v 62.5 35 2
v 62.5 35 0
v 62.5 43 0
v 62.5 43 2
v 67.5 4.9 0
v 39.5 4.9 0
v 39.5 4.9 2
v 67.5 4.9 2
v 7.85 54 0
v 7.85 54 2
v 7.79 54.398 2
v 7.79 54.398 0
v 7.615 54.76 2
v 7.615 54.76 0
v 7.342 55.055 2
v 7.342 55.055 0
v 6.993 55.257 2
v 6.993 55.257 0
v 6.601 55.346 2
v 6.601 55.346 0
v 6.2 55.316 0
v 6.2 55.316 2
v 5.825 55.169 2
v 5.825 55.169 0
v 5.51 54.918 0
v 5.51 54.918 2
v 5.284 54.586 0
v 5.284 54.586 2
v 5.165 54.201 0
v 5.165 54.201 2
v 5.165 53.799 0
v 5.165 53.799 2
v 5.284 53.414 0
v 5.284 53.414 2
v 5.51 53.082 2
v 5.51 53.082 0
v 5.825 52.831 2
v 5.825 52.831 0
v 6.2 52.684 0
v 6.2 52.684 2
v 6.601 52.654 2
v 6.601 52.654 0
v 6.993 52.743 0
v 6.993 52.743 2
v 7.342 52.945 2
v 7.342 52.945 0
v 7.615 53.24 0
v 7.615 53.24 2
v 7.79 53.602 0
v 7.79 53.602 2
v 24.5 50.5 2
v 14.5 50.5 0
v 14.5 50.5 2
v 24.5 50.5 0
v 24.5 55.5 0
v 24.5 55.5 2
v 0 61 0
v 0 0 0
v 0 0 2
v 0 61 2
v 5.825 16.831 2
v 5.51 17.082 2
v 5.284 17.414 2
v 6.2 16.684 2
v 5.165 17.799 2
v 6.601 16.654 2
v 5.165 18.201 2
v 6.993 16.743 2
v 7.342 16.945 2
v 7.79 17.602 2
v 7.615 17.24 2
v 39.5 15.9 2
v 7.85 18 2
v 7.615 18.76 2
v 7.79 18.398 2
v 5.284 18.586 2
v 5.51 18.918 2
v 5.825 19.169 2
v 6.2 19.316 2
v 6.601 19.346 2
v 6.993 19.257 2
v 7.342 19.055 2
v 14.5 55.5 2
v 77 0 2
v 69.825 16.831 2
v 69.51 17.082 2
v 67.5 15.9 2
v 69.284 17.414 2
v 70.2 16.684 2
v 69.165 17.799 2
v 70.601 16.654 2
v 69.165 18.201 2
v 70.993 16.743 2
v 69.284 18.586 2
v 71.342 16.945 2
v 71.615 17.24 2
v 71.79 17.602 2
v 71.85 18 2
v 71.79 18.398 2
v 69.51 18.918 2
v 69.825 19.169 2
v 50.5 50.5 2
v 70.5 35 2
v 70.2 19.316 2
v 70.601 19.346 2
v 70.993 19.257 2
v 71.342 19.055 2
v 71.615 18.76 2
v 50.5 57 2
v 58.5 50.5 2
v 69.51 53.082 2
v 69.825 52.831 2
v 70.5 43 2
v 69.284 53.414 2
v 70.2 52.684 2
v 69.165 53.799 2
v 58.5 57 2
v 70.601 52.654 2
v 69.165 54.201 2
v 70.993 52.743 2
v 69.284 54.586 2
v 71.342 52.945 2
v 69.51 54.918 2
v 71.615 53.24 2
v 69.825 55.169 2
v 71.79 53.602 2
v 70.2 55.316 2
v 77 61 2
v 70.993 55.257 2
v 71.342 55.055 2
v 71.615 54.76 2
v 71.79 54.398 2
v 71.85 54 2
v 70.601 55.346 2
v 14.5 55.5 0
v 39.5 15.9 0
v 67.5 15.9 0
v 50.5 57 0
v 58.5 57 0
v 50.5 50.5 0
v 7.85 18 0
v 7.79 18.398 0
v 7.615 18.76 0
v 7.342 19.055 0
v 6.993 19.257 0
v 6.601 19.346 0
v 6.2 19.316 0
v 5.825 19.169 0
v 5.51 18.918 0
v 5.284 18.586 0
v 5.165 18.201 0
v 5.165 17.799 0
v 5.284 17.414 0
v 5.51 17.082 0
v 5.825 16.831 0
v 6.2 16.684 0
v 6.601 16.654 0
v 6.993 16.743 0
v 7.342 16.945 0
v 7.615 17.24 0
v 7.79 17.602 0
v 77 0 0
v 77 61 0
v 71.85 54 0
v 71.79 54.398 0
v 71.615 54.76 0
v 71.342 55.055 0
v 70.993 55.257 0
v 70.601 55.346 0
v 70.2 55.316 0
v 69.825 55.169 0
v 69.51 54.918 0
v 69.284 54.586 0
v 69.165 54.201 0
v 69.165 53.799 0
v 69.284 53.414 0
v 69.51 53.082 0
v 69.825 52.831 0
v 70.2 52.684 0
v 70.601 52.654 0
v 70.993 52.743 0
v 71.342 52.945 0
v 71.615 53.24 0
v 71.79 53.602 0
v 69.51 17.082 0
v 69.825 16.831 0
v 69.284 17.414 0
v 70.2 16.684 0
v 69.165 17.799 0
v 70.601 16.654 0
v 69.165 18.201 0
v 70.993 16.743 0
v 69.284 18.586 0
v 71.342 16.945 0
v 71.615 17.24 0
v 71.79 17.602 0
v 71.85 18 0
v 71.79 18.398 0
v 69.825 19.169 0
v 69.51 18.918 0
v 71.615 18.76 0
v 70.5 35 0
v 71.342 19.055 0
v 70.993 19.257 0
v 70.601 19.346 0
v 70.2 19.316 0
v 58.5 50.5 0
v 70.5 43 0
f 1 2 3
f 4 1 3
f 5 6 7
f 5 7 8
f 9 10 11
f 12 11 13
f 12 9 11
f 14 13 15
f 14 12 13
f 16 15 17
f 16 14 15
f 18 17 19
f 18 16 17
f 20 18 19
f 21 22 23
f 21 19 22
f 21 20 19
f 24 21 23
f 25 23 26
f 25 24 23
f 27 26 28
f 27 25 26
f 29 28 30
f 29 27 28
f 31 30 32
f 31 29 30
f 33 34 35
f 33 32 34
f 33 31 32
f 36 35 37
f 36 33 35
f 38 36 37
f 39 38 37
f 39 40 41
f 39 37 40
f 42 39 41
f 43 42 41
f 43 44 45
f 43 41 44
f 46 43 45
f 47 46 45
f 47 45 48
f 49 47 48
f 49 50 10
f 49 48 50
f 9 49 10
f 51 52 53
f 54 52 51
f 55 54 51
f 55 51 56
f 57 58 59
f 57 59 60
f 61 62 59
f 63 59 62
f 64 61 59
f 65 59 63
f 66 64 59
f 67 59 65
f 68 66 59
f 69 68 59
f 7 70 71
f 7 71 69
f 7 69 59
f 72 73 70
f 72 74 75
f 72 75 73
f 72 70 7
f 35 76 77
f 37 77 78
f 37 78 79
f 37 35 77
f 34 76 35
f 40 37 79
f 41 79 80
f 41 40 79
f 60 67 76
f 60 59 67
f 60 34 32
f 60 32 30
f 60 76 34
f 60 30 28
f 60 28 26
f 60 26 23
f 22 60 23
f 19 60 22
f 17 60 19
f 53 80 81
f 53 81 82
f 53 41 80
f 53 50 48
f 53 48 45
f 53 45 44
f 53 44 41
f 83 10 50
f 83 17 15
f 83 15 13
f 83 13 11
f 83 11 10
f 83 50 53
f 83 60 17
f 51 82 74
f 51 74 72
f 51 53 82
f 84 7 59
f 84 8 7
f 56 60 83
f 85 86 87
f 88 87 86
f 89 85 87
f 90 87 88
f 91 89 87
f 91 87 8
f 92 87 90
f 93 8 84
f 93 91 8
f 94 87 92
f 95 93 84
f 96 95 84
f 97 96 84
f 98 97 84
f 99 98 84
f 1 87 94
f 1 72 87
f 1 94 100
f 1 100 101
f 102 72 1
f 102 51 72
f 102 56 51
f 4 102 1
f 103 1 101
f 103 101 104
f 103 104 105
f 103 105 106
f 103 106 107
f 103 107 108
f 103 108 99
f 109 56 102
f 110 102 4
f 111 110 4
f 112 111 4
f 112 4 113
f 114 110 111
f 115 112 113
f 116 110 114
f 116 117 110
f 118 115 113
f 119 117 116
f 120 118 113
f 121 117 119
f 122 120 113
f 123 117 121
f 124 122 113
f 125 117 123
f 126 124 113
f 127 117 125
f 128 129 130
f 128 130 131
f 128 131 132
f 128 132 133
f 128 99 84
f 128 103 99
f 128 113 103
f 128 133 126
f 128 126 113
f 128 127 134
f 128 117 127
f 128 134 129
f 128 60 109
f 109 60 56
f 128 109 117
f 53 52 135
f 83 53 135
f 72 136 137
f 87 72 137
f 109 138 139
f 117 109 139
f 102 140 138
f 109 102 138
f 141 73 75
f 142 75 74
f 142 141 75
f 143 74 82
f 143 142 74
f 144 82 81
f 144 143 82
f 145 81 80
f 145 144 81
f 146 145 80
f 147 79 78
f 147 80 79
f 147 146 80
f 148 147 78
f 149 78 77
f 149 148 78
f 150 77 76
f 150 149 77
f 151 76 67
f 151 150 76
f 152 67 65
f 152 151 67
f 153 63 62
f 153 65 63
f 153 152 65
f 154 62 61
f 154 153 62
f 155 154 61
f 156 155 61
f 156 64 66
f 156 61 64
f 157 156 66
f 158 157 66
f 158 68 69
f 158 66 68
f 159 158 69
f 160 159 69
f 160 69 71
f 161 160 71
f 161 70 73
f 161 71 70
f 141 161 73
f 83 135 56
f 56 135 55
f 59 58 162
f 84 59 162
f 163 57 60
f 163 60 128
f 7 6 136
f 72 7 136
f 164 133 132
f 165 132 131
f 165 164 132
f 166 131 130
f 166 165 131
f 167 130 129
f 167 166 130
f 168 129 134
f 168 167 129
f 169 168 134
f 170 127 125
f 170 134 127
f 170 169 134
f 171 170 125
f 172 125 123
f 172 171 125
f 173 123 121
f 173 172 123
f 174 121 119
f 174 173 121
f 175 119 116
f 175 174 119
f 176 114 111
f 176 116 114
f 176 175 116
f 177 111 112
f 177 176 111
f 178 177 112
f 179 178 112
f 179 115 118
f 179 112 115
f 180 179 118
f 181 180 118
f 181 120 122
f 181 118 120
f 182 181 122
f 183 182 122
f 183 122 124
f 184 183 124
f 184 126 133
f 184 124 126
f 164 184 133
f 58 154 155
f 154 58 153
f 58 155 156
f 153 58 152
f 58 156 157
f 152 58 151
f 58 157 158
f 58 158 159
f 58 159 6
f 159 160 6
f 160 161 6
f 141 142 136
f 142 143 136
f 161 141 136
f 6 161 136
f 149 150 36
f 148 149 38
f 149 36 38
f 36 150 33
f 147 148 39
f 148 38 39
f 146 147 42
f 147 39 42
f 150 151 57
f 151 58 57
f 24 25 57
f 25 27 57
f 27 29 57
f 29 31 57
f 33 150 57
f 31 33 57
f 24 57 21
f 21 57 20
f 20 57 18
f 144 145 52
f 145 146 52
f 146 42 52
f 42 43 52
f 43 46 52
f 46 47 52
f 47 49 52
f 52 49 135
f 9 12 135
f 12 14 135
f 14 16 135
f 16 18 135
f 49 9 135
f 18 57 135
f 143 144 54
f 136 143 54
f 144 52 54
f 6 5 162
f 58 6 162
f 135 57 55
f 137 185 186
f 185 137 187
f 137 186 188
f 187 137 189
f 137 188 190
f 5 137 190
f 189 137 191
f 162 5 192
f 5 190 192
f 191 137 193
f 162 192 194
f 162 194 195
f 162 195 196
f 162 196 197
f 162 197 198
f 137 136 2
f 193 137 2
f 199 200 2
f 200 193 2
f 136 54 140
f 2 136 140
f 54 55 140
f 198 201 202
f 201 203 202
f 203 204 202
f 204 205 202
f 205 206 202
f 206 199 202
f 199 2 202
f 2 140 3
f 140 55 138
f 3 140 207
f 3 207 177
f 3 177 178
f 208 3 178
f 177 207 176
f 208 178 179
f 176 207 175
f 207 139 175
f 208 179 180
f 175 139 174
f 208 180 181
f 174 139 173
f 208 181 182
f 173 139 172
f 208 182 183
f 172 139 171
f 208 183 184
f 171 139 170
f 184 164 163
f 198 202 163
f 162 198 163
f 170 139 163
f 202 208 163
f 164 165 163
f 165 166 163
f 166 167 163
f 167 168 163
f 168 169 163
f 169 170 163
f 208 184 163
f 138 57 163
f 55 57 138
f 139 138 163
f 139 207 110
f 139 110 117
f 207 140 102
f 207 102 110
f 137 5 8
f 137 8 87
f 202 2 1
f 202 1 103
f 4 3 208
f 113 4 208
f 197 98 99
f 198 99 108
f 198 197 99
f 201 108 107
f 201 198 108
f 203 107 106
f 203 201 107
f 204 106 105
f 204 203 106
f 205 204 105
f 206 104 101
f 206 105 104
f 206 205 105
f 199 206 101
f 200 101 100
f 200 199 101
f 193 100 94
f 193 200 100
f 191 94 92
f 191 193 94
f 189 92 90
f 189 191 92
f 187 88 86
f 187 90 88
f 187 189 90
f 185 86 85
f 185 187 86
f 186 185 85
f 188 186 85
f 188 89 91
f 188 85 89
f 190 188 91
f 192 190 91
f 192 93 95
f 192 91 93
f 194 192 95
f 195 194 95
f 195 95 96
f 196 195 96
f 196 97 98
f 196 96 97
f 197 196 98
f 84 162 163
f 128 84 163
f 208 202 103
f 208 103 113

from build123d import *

# Parameters (mm, degrees)
SKETCH_1_W          = 77
SKETCH_1_H          = 61
EXTRUDE_1_DEPTH     = 2
SKETCH_2_W          = 28
SKETCH_2_H          = 11
CUT_EXTRUDE_1_DEPTH = 99.254770877
SKETCH_3_W          = 10
SKETCH_3_H          = 5
SKETCH_3_W_2        = 8
SKETCH_3_H_2        = 6.5
SKETCH_3_H_3        = 8
CUT_EXTRUDE_2_DEPTH = 99.254770877
SKETCH_4_R          = 1.35
CUT_EXTRUDE_3_DEPTH = 99.254770877


with BuildPart() as part:
    # 草图1 → 凸台-拉伸1 (new body)
    with BuildSketch(Plane.XY):
        with Locations((38.5, 30.5)):
            Rectangle(SKETCH_1_W, SKETCH_1_H)
    extrude(amount=EXTRUDE_1_DEPTH)

    # 草图2 → 切除-拉伸1 (cut, through all)
    with BuildSketch(Plane.XY):
        with Locations((53.5, 10.4)):
            Rectangle(SKETCH_2_W, SKETCH_2_H)
    extrude(amount=CUT_EXTRUDE_1_DEPTH, mode=Mode.SUBTRACT)

    # 草图3 → 切除-拉伸2 (cut, through all)
    with BuildSketch(Plane.XY):
        with Locations((19.5, 53)):
            Rectangle(SKETCH_3_W, SKETCH_3_H)
        with Locations((54.5, 53.75)):
            Rectangle(SKETCH_3_W_2, SKETCH_3_H_2)
        with Locations((66.5, 39)):
            Rectangle(SKETCH_3_W_2, SKETCH_3_H_3)
    extrude(amount=CUT_EXTRUDE_2_DEPTH, mode=Mode.SUBTRACT)

    # 草图4 → 切除-拉伸3 (cut, through all)
    with BuildSketch(Plane.XY):
        with Locations((6.5, 18)):
            Circle(SKETCH_4_R)
        with Locations((70.5, 18)):
            Circle(SKETCH_4_R)
        with Locations((6.5, 54)):
            Circle(SKETCH_4_R)
        with Locations((70.5, 54)):
            Circle(SKETCH_4_R)
    extrude(amount=CUT_EXTRUDE_3_DEPTH, mode=Mode.SUBTRACT)


solid = part.part
